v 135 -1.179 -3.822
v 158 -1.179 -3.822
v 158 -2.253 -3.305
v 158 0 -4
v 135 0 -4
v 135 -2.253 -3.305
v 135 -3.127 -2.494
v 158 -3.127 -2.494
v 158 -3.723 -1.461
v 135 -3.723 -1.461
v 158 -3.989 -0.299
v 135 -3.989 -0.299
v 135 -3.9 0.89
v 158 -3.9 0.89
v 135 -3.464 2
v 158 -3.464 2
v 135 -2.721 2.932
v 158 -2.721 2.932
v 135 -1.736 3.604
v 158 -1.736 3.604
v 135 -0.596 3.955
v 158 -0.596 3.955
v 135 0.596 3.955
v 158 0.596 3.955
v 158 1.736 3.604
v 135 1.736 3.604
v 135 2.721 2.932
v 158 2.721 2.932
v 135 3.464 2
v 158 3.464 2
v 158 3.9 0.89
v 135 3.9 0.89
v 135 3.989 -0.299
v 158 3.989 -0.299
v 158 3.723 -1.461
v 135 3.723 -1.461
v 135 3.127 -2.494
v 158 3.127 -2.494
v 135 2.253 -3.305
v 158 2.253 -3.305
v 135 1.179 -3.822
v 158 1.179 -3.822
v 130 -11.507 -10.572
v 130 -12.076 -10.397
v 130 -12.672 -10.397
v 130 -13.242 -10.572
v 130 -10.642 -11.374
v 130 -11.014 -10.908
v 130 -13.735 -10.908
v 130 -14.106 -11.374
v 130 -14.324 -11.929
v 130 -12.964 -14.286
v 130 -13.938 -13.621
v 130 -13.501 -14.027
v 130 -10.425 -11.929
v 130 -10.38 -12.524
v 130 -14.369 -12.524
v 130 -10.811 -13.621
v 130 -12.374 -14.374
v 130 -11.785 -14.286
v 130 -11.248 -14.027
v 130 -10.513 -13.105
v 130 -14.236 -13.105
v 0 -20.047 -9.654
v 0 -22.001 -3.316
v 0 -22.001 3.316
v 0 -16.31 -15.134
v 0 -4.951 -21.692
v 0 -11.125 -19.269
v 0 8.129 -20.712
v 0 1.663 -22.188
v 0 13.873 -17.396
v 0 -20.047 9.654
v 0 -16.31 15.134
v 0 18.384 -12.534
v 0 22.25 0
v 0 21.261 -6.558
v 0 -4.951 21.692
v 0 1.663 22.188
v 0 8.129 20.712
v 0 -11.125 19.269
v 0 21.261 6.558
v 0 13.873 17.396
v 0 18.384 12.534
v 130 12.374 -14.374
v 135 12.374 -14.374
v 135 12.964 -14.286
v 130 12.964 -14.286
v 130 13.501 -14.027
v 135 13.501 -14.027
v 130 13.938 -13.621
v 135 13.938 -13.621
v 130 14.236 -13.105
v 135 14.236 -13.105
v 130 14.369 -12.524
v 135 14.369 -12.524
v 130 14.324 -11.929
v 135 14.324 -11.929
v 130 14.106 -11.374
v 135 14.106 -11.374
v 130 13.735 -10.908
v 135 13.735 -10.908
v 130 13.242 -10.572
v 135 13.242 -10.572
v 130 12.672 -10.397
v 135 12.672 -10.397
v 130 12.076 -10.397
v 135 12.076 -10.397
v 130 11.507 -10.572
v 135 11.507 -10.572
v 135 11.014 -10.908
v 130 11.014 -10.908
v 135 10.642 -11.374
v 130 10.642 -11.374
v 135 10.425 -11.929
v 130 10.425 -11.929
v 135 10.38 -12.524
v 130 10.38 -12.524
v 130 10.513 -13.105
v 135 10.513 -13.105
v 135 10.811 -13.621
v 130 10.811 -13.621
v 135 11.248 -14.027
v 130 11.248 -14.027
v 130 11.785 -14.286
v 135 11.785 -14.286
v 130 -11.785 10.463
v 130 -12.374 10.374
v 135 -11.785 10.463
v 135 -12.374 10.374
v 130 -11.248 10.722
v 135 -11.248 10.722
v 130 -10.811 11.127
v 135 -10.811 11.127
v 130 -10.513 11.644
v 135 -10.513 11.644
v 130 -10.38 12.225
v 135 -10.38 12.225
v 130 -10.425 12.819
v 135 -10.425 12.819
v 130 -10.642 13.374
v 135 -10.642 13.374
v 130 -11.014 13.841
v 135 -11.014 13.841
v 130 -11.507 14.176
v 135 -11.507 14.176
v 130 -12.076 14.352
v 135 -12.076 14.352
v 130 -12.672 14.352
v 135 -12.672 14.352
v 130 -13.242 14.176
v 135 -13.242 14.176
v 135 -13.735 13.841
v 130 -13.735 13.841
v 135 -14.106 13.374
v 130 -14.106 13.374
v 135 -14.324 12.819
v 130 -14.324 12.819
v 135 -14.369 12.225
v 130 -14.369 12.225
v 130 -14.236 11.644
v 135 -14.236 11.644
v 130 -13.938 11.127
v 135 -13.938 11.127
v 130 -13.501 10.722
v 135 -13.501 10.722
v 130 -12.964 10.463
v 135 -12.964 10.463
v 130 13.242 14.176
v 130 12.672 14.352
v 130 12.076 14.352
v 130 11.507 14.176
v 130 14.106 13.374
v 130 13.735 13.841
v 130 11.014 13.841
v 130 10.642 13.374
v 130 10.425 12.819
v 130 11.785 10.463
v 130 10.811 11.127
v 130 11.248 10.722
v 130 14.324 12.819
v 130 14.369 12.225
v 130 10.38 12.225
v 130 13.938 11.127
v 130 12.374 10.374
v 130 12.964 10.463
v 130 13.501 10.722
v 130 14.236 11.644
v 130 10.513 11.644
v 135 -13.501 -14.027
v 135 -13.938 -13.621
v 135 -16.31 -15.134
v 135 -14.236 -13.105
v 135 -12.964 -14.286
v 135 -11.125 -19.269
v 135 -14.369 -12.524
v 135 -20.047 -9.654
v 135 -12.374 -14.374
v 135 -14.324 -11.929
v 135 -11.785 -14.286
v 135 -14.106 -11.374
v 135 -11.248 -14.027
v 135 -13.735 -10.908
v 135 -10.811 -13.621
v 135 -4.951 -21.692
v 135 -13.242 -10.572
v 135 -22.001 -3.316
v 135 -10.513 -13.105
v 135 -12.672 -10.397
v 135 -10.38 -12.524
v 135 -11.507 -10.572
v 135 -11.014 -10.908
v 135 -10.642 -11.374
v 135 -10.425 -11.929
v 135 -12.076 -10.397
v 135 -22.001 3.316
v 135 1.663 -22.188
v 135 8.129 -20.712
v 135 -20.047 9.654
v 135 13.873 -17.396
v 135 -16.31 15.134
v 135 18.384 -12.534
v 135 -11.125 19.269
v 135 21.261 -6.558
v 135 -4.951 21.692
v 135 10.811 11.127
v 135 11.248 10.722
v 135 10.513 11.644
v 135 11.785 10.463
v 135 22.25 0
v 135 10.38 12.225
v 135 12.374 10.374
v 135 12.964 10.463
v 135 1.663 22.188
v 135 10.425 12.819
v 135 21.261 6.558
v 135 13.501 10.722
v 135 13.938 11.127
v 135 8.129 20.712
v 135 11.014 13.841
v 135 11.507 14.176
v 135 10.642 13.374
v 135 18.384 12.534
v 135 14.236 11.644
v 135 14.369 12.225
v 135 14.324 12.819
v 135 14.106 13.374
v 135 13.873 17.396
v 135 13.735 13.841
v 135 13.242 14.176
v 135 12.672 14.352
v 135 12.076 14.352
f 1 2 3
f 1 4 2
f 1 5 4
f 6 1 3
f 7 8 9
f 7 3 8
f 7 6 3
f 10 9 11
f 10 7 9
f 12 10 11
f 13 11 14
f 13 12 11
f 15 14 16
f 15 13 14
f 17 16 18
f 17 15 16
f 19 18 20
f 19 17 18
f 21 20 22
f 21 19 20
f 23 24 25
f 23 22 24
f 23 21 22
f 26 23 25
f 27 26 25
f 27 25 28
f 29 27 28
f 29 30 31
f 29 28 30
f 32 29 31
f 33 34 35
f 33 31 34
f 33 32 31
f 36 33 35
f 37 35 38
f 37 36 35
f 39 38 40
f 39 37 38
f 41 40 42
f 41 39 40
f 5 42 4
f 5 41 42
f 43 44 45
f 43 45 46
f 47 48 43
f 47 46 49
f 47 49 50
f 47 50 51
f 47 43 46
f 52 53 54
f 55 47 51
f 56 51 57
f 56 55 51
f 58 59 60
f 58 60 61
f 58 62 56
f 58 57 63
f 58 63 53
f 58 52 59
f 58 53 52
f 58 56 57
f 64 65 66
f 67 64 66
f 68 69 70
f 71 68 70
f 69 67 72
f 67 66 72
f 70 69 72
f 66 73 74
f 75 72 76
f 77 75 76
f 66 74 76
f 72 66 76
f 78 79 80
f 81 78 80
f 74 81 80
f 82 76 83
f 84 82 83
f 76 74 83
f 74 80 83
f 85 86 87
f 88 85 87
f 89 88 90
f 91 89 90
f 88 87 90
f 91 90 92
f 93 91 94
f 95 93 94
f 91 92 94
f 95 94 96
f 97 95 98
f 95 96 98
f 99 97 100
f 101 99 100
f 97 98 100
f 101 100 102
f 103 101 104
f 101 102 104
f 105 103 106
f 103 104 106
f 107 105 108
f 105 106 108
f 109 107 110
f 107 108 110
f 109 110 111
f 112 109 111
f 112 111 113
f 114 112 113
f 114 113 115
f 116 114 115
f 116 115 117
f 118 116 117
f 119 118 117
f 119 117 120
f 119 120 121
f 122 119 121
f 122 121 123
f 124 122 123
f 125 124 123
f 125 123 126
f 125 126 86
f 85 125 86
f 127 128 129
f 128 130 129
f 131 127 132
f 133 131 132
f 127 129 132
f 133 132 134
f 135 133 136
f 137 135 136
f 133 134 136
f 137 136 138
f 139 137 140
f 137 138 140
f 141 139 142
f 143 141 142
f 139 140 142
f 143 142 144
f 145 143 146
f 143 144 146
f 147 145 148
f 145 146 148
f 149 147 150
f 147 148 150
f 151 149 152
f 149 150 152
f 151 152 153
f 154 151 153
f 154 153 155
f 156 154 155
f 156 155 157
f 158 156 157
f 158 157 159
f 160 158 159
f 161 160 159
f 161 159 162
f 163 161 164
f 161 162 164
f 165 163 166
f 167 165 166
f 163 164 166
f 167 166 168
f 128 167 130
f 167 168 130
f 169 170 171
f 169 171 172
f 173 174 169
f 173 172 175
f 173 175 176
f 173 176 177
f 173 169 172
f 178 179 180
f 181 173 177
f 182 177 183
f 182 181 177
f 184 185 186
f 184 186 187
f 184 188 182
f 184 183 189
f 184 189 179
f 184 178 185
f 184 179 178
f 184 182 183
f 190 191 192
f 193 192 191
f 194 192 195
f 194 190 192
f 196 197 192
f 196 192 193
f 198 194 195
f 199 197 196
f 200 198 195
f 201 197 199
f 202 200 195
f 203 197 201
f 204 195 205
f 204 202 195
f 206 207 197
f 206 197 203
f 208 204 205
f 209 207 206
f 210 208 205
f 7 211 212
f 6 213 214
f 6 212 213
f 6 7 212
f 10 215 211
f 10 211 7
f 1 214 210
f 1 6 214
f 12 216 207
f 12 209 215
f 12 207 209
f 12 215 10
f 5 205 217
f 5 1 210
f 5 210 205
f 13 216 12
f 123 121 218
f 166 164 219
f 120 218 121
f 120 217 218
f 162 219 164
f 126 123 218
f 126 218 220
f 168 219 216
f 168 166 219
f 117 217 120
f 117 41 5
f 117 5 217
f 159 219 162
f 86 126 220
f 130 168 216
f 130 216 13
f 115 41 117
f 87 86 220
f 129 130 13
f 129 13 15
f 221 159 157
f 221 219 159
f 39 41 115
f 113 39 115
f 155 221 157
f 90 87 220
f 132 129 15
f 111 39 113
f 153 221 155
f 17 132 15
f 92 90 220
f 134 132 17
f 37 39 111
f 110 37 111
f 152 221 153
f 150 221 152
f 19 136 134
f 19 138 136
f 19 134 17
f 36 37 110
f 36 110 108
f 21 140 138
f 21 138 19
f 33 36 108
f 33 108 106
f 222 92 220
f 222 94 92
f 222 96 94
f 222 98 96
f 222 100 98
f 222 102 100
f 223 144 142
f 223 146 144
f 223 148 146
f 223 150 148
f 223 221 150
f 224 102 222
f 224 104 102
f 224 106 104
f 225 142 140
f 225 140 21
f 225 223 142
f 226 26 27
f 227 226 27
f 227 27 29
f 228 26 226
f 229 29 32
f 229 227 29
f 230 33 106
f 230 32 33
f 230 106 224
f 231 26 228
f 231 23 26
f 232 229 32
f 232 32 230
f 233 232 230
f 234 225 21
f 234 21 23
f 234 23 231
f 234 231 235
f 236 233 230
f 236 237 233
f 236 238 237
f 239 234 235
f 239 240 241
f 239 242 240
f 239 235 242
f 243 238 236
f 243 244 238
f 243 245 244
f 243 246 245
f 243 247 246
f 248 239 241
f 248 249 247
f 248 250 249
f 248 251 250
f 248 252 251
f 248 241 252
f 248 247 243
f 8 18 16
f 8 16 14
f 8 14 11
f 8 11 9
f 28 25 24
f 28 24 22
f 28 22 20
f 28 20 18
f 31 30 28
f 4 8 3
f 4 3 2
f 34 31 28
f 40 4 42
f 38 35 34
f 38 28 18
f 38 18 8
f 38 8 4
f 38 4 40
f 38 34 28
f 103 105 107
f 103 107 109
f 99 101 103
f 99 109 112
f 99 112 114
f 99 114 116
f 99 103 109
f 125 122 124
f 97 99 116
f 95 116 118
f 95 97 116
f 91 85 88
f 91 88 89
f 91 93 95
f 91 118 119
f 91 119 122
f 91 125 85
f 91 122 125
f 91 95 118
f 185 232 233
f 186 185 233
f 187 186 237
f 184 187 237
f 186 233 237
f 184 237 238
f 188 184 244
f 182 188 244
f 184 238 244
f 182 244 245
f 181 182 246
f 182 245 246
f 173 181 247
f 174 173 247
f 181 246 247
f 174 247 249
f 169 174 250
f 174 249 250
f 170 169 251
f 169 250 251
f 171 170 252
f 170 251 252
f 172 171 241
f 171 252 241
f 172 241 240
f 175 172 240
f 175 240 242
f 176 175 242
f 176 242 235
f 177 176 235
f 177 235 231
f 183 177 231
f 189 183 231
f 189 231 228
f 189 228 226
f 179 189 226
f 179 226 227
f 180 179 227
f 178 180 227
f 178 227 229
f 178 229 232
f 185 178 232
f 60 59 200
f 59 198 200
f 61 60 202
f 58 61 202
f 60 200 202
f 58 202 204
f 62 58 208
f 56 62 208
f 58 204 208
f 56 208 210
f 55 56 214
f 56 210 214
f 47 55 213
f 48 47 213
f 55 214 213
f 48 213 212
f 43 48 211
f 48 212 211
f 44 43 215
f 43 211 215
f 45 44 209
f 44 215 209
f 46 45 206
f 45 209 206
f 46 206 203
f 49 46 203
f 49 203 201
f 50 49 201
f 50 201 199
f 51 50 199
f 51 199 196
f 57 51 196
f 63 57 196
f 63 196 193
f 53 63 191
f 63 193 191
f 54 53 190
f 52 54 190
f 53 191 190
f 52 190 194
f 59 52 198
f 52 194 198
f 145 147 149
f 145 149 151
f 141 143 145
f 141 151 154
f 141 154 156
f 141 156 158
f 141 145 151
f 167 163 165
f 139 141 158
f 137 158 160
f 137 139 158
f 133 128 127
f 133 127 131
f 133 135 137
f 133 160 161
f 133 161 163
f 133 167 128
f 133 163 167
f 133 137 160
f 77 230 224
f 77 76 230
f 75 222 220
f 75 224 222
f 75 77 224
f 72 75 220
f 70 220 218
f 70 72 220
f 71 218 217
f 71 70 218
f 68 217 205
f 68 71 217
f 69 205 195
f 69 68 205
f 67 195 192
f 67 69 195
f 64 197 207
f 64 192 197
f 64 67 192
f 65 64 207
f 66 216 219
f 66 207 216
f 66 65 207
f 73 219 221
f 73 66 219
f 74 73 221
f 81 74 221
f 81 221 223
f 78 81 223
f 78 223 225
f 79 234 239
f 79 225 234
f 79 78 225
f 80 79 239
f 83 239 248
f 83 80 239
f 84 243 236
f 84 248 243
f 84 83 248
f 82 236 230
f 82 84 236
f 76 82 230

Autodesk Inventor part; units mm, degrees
ref_plane "YZ Plane" through (0, 0, 0) normal (1, 0, 0) x (0, 1, 0)
ref_plane "XZ Plane" through (0, 0, 0) normal (0, 1, 0) x (-1, 0, 0)
ref_plane "XY Plane" through (0, 0, 0) normal (0, 0, 1) x (1, 0, 0)
sketch "Sketch1" plane through (0, 0, 0) normal (1, 0, 0) x (0, 1, 0)
  circle A0 centre (0, 0) radius 22.25
  dimension "d0" = 44.5
extrude "Extrusion1" add sketch "Sketch1" along normal blind 135
sketch "Sketch2" plane through (135, 0, 0) normal (1, 0, 0) x (0, 0, -1)
  circle A0 centre (0, 0) radius 4
  line L0 (0, 0) -> (12.3744, 12.3744) construction
  line L1 (0, 0) -> (17.5, 0) construction
  line L2 (0, 0) -> (-12.3744, -12.3744) construction
  line L3 (0, 0) -> (17.5, 0) construction
  circle A1 centre (-12.3744, -12.3744) radius 2
  circle A2 centre (12.3744, 12.3744) radius 2
  circle A3 centre (-12.3744, 12.3744) radius 2
  circle A4 centre (12.3744, -12.3744) radius 2
  circle A5 centre (0, 0) radius 17.5 construction
  dimension "d3" = 8
  dimension "d6" = 17.5
  dimension "d7" = 45
  dimension "d8" = 17.5
  dimension "d9" = 135
  dimension "d10" = 4
  dimension "d11" = 4
extrude "Extrusion2" add sketch "Sketch2" along normal blind 23 contours A0
extrude "Extrusion3" cut sketch "Sketch2" against normal blind 5 contours A1 | A2 | A3 | A4
properties part number "MOOOOT"
